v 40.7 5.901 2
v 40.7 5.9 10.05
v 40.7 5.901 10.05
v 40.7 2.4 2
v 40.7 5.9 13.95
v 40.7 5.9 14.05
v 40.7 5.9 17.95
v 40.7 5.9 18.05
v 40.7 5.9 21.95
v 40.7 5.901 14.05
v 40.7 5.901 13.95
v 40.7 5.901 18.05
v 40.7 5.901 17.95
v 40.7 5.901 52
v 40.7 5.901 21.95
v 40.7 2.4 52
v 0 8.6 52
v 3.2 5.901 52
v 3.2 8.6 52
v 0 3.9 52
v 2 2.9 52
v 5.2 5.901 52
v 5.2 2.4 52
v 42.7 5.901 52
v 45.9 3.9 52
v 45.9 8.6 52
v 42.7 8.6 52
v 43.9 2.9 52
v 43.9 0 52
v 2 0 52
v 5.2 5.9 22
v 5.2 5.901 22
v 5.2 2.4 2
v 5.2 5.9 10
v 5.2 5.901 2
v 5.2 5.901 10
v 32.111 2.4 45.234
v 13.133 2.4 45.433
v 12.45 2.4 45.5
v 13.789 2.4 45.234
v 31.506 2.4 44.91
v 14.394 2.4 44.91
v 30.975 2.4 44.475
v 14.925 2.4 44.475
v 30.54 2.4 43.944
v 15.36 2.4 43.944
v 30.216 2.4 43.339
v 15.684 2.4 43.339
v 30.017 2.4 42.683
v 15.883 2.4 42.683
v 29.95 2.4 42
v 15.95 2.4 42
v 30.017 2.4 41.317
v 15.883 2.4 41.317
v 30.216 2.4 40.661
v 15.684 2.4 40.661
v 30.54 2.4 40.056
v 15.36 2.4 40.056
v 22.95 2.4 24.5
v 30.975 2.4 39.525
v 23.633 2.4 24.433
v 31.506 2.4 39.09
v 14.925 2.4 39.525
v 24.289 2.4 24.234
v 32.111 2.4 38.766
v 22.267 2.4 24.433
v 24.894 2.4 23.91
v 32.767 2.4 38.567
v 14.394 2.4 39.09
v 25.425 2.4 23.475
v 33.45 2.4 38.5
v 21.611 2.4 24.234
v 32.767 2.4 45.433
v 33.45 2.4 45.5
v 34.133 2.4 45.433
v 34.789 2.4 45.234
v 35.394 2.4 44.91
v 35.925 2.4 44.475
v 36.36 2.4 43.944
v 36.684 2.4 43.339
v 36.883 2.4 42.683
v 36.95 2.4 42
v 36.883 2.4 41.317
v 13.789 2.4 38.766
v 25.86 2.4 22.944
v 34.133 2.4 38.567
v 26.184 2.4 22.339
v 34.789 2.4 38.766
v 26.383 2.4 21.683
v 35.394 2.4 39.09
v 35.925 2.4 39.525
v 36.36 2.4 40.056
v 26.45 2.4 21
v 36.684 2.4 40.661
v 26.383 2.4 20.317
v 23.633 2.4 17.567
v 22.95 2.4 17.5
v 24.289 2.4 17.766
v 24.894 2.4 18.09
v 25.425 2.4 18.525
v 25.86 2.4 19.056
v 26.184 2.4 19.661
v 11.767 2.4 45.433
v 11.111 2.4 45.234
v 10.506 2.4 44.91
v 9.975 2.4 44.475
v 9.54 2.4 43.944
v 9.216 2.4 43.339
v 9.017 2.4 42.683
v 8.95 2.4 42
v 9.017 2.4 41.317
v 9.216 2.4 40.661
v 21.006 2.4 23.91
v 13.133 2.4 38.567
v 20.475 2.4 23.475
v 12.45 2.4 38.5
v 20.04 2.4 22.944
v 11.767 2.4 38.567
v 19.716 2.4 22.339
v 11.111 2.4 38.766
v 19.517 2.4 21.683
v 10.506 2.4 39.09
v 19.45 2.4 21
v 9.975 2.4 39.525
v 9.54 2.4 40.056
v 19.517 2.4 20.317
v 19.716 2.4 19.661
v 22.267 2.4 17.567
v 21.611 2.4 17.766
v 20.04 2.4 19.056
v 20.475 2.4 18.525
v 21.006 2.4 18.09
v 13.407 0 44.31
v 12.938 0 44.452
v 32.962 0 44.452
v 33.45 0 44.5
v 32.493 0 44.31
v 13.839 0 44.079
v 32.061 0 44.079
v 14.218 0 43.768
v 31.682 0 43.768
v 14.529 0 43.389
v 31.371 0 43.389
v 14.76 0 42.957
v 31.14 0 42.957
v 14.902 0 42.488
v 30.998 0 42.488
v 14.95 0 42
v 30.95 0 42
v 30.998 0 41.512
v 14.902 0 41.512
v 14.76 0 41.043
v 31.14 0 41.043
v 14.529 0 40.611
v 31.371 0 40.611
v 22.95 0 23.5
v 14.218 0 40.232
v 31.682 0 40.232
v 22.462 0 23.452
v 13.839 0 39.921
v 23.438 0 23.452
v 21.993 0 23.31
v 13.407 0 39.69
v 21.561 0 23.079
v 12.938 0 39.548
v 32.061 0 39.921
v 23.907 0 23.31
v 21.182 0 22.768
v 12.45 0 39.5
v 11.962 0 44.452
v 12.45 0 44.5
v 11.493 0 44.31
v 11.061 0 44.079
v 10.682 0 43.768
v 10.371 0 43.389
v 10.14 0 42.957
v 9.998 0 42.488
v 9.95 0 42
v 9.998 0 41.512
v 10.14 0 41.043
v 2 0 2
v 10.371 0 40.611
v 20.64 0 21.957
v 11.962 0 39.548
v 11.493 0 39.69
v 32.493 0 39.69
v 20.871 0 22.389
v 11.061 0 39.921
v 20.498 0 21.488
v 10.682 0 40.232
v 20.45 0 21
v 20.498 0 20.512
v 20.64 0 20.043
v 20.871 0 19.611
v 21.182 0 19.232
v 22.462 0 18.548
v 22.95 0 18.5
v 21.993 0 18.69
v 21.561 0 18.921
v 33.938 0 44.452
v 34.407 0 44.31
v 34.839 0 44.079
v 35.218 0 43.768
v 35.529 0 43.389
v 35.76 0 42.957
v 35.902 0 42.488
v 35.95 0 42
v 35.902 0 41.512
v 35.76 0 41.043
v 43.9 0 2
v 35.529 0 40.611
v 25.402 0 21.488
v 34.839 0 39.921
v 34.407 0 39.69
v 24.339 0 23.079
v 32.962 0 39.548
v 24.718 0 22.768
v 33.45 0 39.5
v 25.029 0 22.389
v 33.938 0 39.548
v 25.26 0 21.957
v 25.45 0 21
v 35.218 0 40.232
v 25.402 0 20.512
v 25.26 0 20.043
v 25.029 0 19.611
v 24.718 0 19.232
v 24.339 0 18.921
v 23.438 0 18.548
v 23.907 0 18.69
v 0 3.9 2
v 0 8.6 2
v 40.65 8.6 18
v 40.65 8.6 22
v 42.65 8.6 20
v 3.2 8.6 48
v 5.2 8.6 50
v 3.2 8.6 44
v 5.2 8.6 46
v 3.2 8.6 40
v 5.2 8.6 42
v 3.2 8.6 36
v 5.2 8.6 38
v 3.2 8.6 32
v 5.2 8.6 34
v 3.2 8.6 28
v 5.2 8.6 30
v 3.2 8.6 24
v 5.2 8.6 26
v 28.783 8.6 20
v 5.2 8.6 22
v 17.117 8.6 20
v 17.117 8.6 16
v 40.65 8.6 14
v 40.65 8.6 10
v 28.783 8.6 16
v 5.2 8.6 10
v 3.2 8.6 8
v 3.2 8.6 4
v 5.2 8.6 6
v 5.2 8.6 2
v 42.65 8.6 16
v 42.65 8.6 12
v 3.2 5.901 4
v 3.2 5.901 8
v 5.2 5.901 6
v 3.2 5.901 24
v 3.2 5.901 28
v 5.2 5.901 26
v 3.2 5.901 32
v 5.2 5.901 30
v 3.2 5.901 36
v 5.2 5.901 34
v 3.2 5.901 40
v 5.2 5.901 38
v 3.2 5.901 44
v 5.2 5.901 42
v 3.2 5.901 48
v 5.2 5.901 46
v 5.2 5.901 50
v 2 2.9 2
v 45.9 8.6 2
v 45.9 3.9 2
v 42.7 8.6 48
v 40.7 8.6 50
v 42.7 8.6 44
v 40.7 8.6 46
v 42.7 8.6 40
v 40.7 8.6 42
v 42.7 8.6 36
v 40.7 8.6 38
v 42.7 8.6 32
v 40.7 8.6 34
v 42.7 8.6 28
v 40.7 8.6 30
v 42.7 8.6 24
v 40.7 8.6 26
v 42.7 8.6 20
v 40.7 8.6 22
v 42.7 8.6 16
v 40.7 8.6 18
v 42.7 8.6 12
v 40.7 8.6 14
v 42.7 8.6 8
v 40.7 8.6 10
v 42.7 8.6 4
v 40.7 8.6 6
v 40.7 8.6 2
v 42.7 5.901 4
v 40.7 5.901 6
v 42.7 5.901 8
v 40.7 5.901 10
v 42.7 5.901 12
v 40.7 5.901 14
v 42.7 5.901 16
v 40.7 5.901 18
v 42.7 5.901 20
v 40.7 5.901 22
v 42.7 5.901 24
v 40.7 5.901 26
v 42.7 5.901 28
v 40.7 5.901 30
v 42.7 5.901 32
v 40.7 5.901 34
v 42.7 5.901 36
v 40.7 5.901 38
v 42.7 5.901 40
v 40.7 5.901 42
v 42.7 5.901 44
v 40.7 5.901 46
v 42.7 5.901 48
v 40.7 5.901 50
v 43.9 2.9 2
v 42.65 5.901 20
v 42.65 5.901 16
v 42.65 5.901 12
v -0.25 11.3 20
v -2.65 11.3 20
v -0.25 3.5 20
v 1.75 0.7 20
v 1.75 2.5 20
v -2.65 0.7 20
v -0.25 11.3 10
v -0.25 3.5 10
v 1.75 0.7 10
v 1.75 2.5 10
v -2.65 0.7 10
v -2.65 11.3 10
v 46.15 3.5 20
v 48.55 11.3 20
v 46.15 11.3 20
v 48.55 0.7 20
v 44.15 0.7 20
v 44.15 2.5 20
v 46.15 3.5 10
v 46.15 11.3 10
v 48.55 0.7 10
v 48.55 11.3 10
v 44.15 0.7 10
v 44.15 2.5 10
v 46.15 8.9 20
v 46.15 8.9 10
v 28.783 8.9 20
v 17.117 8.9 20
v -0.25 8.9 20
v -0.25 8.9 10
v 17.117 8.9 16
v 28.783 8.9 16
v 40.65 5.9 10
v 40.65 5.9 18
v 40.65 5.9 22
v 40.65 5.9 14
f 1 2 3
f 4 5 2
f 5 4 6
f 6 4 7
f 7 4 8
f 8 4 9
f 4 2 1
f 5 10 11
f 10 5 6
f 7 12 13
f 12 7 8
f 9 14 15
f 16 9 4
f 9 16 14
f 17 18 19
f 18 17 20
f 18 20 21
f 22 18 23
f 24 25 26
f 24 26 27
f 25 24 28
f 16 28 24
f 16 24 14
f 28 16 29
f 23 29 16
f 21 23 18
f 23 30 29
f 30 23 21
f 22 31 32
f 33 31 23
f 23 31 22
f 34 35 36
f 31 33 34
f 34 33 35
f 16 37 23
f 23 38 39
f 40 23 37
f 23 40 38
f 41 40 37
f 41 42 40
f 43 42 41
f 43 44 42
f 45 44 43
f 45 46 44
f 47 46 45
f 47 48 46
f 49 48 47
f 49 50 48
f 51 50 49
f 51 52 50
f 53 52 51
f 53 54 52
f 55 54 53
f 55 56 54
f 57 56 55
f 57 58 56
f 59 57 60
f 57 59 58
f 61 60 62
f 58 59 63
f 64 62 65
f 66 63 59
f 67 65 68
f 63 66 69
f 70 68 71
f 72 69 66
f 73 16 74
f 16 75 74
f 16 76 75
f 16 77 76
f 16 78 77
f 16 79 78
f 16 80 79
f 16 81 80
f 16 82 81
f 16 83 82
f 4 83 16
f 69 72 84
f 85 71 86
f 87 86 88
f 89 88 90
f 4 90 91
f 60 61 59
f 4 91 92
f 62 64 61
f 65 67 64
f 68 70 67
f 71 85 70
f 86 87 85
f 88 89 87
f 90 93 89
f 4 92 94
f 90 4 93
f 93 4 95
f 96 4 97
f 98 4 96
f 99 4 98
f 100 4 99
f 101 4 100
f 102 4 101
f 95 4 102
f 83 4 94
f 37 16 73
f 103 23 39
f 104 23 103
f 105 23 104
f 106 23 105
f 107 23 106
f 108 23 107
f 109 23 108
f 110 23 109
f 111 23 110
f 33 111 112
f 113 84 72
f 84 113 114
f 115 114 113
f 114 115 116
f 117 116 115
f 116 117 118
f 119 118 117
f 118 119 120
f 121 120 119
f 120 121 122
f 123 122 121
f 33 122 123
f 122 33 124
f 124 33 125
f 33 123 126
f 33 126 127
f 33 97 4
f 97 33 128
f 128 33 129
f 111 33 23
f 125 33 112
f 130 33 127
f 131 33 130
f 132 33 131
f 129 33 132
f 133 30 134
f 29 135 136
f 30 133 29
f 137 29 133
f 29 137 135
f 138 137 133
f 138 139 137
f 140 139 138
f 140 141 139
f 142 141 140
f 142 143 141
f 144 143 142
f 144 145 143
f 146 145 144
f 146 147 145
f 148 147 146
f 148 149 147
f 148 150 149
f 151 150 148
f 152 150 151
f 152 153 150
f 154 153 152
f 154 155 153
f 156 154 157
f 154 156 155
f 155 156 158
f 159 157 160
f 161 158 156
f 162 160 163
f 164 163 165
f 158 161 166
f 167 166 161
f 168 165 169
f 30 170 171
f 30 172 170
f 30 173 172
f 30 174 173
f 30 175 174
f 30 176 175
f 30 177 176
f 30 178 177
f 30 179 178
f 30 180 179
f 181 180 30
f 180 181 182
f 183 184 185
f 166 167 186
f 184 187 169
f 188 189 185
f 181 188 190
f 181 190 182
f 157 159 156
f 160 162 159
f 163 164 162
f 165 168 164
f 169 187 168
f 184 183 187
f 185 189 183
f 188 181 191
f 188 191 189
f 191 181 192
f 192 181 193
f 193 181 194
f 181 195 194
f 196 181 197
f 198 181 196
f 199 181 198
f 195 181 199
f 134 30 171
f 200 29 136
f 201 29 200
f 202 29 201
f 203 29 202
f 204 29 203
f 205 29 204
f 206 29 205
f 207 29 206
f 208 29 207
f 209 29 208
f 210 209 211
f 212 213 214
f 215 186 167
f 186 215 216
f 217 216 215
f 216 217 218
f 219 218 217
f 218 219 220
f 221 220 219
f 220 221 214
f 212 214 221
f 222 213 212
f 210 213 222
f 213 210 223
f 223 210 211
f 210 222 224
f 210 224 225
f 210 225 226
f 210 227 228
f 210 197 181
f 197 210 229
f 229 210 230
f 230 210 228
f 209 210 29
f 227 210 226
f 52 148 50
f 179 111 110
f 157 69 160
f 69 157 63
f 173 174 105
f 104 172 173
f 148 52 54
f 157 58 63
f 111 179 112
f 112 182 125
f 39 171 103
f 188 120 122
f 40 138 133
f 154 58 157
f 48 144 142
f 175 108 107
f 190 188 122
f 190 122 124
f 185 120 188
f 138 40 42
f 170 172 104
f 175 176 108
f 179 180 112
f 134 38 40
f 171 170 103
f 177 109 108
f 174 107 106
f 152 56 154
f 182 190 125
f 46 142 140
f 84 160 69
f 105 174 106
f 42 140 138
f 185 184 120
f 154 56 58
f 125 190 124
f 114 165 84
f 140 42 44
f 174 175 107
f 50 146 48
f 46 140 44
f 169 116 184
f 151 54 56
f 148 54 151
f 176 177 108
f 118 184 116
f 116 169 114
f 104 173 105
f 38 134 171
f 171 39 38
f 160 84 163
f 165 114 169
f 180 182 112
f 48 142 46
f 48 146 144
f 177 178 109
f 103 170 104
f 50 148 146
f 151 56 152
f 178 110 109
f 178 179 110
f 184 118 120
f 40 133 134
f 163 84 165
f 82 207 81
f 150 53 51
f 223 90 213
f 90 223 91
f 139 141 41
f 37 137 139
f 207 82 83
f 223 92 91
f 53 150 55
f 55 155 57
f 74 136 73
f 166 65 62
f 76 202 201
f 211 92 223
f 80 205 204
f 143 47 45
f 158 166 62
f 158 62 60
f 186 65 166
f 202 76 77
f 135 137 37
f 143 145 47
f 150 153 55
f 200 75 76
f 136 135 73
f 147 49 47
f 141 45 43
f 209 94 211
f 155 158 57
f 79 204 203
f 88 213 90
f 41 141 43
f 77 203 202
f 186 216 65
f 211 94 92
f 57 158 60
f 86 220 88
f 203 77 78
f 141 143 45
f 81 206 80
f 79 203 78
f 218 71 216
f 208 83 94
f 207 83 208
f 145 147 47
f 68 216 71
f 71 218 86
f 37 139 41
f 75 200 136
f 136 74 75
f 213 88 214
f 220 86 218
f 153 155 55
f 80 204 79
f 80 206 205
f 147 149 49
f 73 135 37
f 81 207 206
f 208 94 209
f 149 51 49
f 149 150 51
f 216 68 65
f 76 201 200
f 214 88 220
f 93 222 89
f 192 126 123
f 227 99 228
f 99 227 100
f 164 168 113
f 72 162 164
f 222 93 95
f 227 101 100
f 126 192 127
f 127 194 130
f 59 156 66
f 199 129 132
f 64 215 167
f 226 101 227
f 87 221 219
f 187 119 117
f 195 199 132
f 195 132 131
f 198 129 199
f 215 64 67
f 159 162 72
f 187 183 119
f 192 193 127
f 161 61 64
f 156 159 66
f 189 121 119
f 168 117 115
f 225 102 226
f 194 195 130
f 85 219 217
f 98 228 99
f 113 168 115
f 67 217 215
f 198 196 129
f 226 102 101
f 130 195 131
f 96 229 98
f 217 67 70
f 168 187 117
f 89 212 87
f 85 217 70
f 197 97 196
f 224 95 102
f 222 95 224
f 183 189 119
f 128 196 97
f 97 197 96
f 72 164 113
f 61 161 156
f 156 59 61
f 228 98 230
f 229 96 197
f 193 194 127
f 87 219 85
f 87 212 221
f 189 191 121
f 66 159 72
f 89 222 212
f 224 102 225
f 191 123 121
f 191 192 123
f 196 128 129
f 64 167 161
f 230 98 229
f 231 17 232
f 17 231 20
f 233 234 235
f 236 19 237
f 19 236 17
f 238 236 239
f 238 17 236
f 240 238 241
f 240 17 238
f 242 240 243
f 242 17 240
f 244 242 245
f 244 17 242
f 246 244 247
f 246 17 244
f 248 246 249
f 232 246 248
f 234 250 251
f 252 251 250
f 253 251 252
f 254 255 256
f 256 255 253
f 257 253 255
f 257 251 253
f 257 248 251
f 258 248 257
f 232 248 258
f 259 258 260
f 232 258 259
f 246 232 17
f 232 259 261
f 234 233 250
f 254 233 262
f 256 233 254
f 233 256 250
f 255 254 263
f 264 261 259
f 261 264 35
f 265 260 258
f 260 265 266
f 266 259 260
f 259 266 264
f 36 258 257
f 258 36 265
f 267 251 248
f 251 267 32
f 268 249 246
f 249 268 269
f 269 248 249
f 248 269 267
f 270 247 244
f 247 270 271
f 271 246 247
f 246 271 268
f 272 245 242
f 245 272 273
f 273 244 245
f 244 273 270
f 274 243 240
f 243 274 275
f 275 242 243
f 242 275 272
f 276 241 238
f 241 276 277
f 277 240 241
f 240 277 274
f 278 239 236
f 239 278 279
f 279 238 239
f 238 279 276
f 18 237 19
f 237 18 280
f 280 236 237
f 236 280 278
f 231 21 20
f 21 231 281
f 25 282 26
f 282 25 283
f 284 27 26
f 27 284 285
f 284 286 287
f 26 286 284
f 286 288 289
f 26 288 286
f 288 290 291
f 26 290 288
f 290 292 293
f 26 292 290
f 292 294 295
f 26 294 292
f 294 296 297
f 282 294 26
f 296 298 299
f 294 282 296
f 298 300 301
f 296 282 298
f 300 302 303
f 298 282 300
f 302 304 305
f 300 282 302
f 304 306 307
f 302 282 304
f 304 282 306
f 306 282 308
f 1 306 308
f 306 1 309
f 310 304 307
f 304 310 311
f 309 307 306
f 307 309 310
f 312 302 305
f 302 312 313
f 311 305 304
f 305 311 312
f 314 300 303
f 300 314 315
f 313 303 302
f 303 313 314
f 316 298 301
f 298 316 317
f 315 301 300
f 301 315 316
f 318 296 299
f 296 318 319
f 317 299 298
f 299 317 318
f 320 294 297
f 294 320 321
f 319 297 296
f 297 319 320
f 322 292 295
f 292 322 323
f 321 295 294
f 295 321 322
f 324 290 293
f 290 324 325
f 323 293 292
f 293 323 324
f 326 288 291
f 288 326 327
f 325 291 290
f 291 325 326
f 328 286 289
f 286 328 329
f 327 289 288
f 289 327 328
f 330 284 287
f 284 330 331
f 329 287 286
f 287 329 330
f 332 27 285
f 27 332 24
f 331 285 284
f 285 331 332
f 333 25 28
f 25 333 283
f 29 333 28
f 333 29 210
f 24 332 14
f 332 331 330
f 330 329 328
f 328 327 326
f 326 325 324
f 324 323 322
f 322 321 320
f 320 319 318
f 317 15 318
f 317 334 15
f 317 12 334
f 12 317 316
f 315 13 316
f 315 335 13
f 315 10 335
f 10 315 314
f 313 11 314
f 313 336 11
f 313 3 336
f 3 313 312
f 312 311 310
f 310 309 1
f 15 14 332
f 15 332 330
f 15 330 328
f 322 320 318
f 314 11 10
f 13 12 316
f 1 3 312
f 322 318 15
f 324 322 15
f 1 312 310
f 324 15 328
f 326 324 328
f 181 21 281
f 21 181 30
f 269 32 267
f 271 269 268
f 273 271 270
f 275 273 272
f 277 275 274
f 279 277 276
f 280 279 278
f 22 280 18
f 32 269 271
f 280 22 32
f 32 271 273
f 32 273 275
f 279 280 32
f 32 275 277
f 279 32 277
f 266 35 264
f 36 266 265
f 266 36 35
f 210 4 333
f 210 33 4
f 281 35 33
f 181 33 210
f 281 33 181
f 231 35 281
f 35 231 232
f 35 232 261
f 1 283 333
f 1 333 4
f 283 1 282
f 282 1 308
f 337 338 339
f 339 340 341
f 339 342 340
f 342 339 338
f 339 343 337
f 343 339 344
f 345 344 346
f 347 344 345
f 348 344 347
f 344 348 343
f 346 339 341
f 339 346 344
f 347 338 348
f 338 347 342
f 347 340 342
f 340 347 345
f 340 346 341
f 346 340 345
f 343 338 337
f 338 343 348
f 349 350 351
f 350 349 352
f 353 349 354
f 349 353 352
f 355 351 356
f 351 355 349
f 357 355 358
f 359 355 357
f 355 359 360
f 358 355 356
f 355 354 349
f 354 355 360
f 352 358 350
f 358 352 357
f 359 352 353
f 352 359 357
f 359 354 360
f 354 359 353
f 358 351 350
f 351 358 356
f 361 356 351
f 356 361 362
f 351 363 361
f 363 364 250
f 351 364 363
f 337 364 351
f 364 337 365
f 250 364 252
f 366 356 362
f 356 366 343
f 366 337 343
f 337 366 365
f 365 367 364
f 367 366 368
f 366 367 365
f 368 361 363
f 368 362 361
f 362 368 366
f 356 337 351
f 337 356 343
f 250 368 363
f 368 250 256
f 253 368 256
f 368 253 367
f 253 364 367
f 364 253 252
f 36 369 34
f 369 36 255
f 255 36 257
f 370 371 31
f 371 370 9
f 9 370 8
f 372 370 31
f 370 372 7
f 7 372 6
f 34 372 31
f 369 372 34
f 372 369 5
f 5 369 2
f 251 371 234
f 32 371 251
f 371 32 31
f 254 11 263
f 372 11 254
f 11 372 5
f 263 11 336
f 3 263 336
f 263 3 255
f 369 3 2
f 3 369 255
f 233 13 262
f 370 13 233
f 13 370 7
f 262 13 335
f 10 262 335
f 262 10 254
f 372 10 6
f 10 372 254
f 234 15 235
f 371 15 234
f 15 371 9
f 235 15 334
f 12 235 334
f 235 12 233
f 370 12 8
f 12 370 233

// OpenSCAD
/*
This program is free software: you can redistribute it and/or modify it under the terms of the GNU General Public License as published by the Free Software Foundation, either version 3 of the License, or (at your option) any later version.

This program is distributed in the hope that it will be useful, but WITHOUT ANY WARRANTY; without even the implied warranty of MERCHANTABILITY or FITNESS FOR A PARTICULAR PURPOSE. See the GNU General Public License for more details.

You should have received a copy of the GNU General Public License along with this program. If not, see <https://www.gnu.org/licenses/>.
*/


bracketWidth = 35;
bracketWidthSpaced = bracketWidth + 0.5;
bracketThickness = 3.5;

//mountHeight = 50;
mountThickness = 2.4;
//Must be >= teethSize
endStop1 = 3.2;
grooveOffset = 2;

//Height of teeth; triangle base is double the height
teethSize = 2;
//A half-tooth will be added to this
numTeeth = 12;
teethThickness = 2.7;
teethBacking = 3.2;

holeDia = 5;
//from top of mount to center of hole
topHoleVOffset = 10;
//from top of mount to center of hole
bottomHoleVOffset = 31;
//horizontal distance between center of holes; set to 0 for a single centered hole.
topHoleHOffset = 21;
//horizontal distance between center of holes; set to 0 for a single centered hole.
bottomHoleHOffset = 0;

raThickness = 2.4;

numBarTeeth = 3;

mountHeight = (numTeeth+1) * (teethSize*2);
mountWidth = bracketWidthSpaced + 2*(teethSize + teethBacking);

e = 0.001;

module bracketEnd() {
    cube(size=[endStop1, mountThickness + bracketThickness + e, mountHeight]);
}

module tooth() {
    //backing
    cube(size=[teethBacking, teethThickness, teethSize*2]);
    
    //color([255/255, 0/255, 0/255])
    translate([teethSize + teethBacking, 0, teethSize])
    rotate([0, 0, 90])
    prism(teethThickness, teethSize, teethSize);
    
    //color([255/255, 0/255, 0/255])
    translate([teethBacking, 0, 0])
    rotate([90, 0, 90])
    prism(teethThickness, teethSize, teethSize);
}

//provides a printable angled groove for the retention arm to slide on
module angleGroove(grooveHeight) {
    //color([0/255, 0/255, 255/255])
    rotate([0, -90, 0])
    prism(grooveHeight, teethBacking/2, teethBacking);
}

module teeth() {
    for (i=[0:numTeeth]) { //makes one extra; gonna cut one in half
        translate([0, 0, i * (teethSize*2)])
        tooth();
    }
    
    //extra overlap with endstop
    translate([0, -grooveOffset, 0])
    cube(size=[teethThickness, grooveOffset, mountHeight]);
    
    translate([teethBacking, -teethBacking/2-grooveOffset, 0])
    angleGroove(mountHeight);
    
    
}

module hole() {
    rotate([90, 0, 0])
    cylinder(r1=holeDia/2+1, r2=holeDia/2, h=mountThickness+e, $fn=32);
}

module bracket() {
    
    //back
    difference() {
        cube(size=[bracketWidthSpaced, mountThickness, mountHeight]);
        
        //top right hole
        translate([bracketWidthSpaced/2-topHoleHOffset/2, mountThickness, mountHeight-topHoleVOffset])
        hole();
        
        //top left hole
        translate([bracketWidthSpaced/2+topHoleHOffset/2, mountThickness, mountHeight-topHoleVOffset])
        hole();
        
        //bottom right hole
        translate([bracketWidthSpaced/2-bottomHoleHOffset/2, mountThickness, mountHeight-bottomHoleVOffset])
        hole();
        
        //bottom left hole
        translate([bracketWidthSpaced/2+bottomHoleHOffset/2, mountThickness, mountHeight-bottomHoleVOffset])
        hole();
    }
    
    
    //end steps 1
    translate([bracketWidthSpaced, 0, 0])
    bracketEnd();
    
    translate([-endStop1, 0, 0])
    bracketEnd();
    
    //teeth
    translate([-endStop1-teethBacking + (endStop1-teethSize), mountThickness + bracketThickness, 0])
    teeth();
    
    mirror([1, 0, 0])
    translate([-bracketWidthSpaced-endStop1-teethBacking + (endStop1-teethSize), mountThickness + bracketThickness, 0])
    teeth();
}

module trimmedBracket() {
    difference() {
        bracket();
        
        translate([-endStop1-teethBacking-teethSize, -1, 0])
        cube(size=[bracketWidthSpaced*2, 10, teethSize]);
    }
}

module raSideArm(height) {
    grooveGap = 0.7;
    sideArmLen = teethThickness+grooveOffset+grooveGap+raThickness;
    
    cube(size=[raThickness, sideArmLen+teethBacking/2, 5*teethSize]);
    
    difference() {
        
        //Groove and backing
        union() {
            translate([raThickness, sideArmLen, 0])
            mirror([1, 0, 0])
            angleGroove(height);
            
            translate([0, sideArmLen+teethBacking/2, 0])
            cube(size=[teethBacking+raThickness, 1.2, height]);
        }
        
        //trim to account for overlap with endstop
        //color([0/255, 255/255, 0/255])
        translate([teethBacking + raThickness - (endStop1-teethSize), sideArmLen, 0])
        cube(size=[teethBacking+2, teethBacking+2, height+e]);
        
        echo(str("groove len = ", teethBacking + raThickness - (endStop1-teethSize)));
    }
}

module retainingArm() {
    mw = mountWidth + 0.5;
    raHeight = 5*teethSize;
    
    //back
    cube(size=[mw, raThickness, raHeight]);
    
    //tab
    translate([(mw - bracketWidth/3)/2, 2.4, raHeight-4])
    cube(size=[bracketWidth/3, 2.4 + 0.3, 4]);
    
    //arm
    translate([-raThickness, 0, 0])
    raSideArm(raHeight);
    
    //arm
    translate([mw+raThickness, 0, 0])
    mirror([1, 0, 0])
    raSideArm(raHeight);
}

module bar() {
    height = numBarTeeth * teethSize*2;
    
    difference() {
        cube(size=[bracketWidthSpaced, teethThickness, height]);
        
    }
    
    
    for (i=[0:numBarTeeth-1]) {
        translate([teethBacking, 0, i * (teethSize*2)])
        mirror([1, 0, 0])
        tooth();
    }
    
    for (i=[0:numBarTeeth-1]) {
        translate([-teethBacking+bracketWidthSpaced, 0, i * (teethSize*2)])
        tooth();
    }
}


translate([teethSize + teethBacking, 0, 0])
trimmedBracket();

translate([-0.25, mountThickness + bracketThickness + teethThickness + raThickness + 0.3, 10])
mirror([0, 1, 0])
retainingArm();

color([0/255, 255/255, 0/255])
translate([teethBacking+endStop1-teethSize+.75, mountThickness+bracketThickness, 10])
bar();


module prism(extrusion, width, h){
    polyhedron(
        points=[[0,0,0], [extrusion,0,0], [extrusion,width,0], [0,width,0], [0,width,h], [extrusion,width,h]],
        faces=[[0,1,2,3],[5,4,3,2],[0,4,5,1],[0,3,4],[5,2,1]]
    );
}
